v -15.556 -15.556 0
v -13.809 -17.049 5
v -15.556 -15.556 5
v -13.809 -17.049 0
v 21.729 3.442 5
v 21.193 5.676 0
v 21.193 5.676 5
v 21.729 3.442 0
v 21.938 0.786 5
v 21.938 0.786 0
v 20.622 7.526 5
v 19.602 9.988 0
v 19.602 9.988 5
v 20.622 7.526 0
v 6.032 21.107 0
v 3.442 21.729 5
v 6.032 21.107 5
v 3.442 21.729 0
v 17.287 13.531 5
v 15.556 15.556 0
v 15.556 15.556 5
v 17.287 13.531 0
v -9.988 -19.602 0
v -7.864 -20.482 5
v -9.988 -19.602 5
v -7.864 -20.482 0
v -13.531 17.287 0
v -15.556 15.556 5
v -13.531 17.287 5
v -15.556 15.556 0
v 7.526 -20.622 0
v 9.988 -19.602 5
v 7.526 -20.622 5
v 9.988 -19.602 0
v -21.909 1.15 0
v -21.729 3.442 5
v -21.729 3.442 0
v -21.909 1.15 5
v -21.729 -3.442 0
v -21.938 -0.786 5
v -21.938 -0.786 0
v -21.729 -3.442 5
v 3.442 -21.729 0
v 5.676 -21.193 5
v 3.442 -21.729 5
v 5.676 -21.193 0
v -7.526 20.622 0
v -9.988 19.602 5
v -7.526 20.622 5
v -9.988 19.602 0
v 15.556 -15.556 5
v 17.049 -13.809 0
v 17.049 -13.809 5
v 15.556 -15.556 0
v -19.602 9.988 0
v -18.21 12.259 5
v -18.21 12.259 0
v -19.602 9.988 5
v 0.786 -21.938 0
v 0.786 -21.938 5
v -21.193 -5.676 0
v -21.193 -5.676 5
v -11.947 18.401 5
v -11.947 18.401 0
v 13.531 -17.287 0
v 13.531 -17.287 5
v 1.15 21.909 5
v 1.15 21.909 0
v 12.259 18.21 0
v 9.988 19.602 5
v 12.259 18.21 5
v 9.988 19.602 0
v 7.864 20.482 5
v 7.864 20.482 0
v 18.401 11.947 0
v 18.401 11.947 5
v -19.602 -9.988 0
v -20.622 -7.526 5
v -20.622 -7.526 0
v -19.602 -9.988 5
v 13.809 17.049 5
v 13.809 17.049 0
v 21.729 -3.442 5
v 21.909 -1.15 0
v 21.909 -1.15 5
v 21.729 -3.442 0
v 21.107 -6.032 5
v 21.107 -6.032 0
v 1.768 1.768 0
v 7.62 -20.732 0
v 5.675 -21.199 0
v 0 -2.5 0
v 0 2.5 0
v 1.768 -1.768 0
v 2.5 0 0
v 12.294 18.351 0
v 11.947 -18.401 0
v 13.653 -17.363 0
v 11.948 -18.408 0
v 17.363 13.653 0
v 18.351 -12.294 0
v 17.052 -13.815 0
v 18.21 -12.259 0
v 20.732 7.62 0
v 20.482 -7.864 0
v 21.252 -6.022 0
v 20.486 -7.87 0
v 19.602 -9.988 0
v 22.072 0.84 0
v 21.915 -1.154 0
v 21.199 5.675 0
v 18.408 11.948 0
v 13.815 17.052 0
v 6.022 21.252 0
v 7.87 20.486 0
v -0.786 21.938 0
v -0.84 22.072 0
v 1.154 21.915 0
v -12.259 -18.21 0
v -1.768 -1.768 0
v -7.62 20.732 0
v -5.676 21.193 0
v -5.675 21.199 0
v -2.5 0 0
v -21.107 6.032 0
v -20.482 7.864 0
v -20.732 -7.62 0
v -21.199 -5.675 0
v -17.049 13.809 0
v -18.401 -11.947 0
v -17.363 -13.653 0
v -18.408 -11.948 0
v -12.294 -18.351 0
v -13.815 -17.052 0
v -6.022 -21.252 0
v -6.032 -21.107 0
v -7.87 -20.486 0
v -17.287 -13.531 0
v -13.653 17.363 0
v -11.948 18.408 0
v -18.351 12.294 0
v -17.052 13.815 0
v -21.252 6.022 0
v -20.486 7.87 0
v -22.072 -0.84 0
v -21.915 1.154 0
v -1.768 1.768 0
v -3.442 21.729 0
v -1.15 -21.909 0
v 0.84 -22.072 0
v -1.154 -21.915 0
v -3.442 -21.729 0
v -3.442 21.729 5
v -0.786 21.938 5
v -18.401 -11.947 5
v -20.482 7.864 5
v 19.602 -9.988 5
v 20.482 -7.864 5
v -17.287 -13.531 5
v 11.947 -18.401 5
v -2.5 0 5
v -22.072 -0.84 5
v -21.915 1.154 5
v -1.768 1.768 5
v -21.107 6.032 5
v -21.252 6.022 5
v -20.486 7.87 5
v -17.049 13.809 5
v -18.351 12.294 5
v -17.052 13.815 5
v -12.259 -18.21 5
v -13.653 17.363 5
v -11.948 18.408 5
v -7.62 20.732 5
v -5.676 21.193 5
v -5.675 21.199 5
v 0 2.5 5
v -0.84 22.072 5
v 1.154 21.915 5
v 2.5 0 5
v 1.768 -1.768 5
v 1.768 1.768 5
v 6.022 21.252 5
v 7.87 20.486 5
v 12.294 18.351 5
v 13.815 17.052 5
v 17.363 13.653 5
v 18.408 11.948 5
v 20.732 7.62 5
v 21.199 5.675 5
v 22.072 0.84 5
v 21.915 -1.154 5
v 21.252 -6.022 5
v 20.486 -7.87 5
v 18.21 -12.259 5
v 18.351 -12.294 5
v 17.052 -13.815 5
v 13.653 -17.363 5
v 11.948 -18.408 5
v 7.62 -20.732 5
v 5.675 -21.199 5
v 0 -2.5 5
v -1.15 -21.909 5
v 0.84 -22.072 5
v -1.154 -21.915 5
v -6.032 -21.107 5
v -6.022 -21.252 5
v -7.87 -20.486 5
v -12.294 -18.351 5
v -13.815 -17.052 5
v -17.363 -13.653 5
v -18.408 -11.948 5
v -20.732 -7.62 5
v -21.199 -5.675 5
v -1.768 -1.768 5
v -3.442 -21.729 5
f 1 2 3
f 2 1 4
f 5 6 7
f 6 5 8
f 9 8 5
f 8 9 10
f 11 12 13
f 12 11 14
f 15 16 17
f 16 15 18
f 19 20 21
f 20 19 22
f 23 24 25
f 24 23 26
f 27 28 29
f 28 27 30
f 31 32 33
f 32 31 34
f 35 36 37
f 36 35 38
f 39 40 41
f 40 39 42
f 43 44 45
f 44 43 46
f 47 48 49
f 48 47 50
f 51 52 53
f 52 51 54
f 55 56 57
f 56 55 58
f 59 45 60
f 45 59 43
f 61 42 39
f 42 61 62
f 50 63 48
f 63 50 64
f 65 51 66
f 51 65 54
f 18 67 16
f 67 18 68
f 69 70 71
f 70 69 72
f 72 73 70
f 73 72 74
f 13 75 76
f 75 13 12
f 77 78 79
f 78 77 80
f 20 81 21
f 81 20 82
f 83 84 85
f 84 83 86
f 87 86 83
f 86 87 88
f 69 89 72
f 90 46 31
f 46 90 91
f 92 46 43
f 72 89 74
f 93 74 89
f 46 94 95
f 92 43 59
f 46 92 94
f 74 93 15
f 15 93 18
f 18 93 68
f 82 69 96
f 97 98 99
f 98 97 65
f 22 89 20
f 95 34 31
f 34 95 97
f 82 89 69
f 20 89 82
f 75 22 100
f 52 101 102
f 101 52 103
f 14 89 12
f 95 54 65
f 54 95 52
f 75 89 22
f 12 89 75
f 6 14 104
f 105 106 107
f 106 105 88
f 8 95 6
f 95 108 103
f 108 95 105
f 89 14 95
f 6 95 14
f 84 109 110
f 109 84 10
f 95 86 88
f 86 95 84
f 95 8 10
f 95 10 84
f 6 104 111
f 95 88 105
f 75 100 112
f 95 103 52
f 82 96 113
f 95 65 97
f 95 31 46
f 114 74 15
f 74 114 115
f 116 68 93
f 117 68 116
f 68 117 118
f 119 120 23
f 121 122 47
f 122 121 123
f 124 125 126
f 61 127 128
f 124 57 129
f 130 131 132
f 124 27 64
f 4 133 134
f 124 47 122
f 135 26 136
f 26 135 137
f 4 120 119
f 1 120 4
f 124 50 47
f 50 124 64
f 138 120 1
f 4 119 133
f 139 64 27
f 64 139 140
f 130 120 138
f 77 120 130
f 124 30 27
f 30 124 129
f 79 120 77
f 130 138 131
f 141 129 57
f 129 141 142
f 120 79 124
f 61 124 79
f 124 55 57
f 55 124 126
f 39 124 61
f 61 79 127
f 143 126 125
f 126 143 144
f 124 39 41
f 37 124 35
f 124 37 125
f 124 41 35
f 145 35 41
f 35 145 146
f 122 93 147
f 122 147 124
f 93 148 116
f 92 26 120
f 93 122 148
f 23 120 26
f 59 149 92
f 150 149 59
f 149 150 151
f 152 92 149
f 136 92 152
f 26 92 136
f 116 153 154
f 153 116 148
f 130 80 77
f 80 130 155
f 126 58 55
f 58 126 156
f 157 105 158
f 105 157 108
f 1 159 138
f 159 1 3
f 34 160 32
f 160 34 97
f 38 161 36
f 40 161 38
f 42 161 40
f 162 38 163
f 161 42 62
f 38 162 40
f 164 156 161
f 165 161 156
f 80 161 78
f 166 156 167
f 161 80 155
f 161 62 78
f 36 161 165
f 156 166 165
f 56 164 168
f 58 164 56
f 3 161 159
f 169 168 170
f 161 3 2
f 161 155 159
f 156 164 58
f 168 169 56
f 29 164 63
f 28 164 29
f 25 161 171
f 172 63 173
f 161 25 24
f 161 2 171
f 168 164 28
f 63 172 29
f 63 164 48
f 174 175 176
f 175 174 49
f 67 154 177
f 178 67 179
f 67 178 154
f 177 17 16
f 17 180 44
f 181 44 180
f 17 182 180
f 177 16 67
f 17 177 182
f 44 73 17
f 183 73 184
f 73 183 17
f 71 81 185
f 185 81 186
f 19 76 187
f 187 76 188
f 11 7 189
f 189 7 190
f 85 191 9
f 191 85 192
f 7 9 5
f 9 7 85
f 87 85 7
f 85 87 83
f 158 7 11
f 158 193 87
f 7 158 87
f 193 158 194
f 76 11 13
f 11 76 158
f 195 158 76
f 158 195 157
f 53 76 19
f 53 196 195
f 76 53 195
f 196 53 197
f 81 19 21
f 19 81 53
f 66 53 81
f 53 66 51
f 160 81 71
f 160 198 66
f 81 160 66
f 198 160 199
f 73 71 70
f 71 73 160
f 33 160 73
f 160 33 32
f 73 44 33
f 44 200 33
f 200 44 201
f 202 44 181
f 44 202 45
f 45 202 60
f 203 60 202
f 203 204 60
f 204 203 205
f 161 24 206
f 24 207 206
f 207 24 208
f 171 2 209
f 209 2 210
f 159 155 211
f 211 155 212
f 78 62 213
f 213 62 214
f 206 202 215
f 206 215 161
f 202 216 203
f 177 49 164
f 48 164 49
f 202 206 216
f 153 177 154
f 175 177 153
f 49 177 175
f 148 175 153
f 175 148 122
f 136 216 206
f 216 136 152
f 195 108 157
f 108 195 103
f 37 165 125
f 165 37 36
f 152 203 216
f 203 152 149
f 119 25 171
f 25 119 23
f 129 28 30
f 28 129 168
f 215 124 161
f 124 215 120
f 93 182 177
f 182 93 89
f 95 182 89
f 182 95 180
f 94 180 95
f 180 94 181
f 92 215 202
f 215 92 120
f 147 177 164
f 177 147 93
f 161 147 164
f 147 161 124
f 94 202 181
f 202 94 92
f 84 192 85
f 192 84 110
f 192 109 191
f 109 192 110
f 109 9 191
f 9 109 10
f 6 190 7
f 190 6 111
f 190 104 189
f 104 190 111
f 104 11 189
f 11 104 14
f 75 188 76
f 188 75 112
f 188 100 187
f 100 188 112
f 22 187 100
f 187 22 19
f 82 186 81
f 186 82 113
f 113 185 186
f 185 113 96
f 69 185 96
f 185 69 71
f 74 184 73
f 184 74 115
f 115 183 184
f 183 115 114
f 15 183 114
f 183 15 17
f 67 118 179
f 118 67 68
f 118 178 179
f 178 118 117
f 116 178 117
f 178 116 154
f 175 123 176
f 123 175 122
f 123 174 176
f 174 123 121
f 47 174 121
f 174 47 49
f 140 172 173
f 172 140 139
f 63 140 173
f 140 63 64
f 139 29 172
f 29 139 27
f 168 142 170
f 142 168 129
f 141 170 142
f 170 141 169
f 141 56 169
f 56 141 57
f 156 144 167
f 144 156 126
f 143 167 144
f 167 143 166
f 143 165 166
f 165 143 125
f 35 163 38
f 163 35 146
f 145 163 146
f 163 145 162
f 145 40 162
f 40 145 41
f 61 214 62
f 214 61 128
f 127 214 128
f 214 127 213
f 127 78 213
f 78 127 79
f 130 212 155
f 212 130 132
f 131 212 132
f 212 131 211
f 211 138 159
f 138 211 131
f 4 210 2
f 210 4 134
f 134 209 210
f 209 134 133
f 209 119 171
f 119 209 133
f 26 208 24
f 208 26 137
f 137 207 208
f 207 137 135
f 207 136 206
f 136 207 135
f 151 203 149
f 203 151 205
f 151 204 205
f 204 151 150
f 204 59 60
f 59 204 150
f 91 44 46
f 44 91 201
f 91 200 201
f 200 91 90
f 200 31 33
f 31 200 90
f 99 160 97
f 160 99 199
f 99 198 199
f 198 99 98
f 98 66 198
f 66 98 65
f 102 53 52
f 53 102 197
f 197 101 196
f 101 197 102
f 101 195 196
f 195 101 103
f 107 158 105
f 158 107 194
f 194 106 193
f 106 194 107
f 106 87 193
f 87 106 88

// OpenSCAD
module gear(teeth = 20, thickness = 5, bore_diameter = 5, tooth_depth = 2) {
    // Gear parameters
    pitch_diameter = teeth * 2;
    outer_diameter = pitch_diameter + 2 * tooth_depth;
    inner_diameter = pitch_diameter - 2 * tooth_depth;

    // Gear body
    difference() {
        cylinder(h = thickness, d = outer_diameter, $fn = teeth * 2);
        cylinder(h = thickness, d = bore_diameter);
    }

    // Gear teeth
    for (i = [0:teeth-1]) {
        rotate([0, 0, i * 360 / teeth])
        translate([pitch_diameter / 2, 0, 0])
        rotate([0, 0, -90 / teeth])
        linear_extrude(height = thickness)
        polygon(points = [[0, 0], [tooth_depth, -tooth_depth / 2], [tooth_depth, tooth_depth / 2]]);
    }
}

// Render the gear
gear();
